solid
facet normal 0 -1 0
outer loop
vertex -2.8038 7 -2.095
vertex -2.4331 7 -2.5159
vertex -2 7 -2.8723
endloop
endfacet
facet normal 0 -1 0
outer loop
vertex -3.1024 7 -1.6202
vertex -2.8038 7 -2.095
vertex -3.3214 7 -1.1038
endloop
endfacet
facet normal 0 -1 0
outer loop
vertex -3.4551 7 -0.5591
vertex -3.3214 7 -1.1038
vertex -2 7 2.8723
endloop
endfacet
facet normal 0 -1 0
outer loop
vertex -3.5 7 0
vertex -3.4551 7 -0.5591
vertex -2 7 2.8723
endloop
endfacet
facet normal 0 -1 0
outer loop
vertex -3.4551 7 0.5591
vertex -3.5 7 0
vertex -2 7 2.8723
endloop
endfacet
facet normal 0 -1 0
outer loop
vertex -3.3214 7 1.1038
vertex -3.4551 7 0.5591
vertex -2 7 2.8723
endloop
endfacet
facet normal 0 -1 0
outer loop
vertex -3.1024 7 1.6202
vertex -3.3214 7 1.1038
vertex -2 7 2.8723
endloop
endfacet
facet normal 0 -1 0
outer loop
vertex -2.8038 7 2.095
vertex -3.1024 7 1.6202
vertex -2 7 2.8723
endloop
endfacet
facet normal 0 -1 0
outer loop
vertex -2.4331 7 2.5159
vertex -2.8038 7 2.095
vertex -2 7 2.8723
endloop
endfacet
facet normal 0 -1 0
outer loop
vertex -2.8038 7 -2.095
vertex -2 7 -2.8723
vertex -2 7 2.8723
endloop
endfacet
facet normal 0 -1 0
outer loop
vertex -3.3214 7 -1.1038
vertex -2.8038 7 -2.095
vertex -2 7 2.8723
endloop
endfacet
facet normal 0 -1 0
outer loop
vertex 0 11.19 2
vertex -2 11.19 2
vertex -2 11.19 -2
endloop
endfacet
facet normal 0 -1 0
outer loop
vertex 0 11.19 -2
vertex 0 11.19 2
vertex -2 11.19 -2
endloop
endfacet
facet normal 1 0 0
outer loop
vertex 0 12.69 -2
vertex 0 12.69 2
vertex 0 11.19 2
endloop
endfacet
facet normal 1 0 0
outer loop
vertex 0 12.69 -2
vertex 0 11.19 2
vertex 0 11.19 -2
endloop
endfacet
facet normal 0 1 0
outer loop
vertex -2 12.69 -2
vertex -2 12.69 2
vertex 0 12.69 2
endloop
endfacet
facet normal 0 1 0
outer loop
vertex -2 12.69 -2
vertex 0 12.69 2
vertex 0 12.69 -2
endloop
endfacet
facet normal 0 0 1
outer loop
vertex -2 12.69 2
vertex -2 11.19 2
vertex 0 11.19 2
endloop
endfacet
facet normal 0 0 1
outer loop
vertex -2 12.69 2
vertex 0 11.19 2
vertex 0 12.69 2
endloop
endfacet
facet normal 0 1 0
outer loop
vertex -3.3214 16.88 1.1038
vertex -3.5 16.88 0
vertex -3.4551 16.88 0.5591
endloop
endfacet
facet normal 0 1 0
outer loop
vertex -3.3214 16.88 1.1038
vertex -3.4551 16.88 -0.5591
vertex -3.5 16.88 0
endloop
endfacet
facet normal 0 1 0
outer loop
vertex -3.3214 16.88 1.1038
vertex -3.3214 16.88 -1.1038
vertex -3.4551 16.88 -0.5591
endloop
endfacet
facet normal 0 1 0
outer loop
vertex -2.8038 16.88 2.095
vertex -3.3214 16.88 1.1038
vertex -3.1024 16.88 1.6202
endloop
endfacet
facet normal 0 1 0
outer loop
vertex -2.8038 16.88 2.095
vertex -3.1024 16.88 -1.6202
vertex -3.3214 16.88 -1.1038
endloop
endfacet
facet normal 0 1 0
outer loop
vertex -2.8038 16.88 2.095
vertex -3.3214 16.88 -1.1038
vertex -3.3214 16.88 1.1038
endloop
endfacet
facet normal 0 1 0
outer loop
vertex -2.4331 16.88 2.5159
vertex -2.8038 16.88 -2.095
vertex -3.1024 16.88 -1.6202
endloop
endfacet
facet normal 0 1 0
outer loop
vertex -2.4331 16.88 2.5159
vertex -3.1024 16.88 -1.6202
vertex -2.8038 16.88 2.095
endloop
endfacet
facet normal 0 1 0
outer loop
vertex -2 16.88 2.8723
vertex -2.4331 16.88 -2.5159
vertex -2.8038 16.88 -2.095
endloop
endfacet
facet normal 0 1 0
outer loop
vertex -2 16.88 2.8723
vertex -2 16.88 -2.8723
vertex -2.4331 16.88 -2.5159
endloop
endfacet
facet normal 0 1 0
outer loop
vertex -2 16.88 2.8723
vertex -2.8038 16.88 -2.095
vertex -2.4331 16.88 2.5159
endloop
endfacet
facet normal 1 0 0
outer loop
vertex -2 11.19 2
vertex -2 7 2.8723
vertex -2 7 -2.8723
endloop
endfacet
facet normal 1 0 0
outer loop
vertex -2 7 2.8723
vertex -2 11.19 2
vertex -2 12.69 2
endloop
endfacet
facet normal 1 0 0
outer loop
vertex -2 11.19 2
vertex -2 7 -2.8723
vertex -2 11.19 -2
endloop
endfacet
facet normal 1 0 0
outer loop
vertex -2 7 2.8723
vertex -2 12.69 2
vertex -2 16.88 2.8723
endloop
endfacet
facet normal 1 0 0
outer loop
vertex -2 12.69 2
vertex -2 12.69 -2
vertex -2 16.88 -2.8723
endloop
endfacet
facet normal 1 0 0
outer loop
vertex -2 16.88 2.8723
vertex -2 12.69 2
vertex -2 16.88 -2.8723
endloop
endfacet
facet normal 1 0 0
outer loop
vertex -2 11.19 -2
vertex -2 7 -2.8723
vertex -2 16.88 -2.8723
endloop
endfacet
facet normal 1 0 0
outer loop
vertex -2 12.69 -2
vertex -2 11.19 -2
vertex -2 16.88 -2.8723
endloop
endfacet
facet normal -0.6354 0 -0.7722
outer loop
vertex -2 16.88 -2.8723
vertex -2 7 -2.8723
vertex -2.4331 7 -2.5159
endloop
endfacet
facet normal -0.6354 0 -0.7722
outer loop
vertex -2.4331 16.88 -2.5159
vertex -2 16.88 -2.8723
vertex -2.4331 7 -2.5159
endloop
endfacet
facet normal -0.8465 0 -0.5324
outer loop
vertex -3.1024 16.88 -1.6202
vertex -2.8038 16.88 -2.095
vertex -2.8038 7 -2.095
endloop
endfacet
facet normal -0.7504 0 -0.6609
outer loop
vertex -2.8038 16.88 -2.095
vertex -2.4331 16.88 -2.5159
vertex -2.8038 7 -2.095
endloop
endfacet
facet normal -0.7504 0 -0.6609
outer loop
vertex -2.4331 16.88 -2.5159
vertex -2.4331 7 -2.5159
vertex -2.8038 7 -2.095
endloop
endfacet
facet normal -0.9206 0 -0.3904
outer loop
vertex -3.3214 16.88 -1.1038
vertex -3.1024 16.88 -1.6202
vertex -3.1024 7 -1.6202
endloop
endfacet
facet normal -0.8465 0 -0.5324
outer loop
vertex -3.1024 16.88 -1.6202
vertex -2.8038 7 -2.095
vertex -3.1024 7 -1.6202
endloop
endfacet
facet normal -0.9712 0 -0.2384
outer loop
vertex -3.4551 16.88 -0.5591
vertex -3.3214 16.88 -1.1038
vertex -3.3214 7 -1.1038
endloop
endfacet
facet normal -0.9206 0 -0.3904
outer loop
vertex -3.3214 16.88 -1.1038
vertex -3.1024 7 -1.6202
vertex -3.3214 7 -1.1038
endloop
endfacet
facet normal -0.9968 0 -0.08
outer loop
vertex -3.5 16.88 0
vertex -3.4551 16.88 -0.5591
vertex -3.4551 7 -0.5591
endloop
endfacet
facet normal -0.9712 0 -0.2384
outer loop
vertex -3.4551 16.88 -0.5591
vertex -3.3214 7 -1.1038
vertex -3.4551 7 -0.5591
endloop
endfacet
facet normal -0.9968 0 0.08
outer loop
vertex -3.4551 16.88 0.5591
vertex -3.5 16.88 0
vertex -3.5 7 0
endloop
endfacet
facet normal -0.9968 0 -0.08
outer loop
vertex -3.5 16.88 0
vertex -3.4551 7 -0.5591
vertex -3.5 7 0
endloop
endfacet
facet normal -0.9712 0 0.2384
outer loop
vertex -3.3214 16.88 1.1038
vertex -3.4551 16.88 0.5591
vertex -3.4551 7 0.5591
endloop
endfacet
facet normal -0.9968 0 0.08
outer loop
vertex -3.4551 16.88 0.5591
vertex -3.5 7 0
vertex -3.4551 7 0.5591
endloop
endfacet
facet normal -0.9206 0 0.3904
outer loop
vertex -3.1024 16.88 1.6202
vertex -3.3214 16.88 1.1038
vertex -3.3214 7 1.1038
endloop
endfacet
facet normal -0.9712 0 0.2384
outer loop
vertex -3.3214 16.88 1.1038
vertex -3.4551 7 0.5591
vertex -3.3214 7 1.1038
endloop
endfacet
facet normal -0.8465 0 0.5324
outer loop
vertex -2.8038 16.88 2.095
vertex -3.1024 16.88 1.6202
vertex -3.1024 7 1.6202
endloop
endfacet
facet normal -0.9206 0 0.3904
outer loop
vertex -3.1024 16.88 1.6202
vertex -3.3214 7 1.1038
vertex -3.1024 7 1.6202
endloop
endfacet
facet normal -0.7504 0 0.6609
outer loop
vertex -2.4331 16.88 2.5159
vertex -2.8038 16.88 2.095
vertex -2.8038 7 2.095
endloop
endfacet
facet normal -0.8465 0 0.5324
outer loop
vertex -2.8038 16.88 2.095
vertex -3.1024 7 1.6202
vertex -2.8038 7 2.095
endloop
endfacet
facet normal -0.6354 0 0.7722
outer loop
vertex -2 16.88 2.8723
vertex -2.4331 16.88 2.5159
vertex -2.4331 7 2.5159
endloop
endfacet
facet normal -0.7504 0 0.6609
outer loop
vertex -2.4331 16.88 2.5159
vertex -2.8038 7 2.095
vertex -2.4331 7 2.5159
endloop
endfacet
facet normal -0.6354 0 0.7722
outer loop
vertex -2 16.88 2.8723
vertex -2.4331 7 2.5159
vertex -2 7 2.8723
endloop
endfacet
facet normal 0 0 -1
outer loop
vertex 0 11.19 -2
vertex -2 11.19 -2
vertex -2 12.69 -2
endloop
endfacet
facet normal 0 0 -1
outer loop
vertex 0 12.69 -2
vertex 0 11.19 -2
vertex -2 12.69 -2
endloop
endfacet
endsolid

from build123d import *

# Parameters (mm, degrees)
SKETCH_1_R               = 2.5
EXTRUDE_1_DEPTH          = 23.88
SKETCH_2_R               = 1
EXTRUDE_2_DEPTH          = 1
CUT_EXTRUDE_1_DEPTH      = 5
CUT_EXTRUDE_START        = 18.88
CUT_EXTRUDE_2_DEPTH      = 5
SKETCH_6_R               = 0.25
CUT_EXTRUDE_3_DEPTH      = 0.25
CUT_EXTRUDE_START_2      = 5.25
SKETCH_7_R               = 0.25
CUT_EXTRUDE_4_DEPTH      = 0.25
EXTRUDE_START            = 7
SKETCH_17_R              = 3.5
EXTRUDE_5_DEPTH          = 9.88
CUT_EXTRUDE_6_DEPTH      = 26.937509518
CUT_EXTRUDE_6_DEPTH_BACK = 26.937509518
SKETCH_20_OUTSIDE_W      = 20.616
SKETCH_20_OUTSIDE_H      = 31.496
SKETCH_20_OUTSIDE_W_2    = 7
SKETCH_20_OUTSIDE_H_2    = 9.88
CUT_EXTRUDE_7_DEPTH      = 18.590747568
CUT_EXTRUDE_7_DEPTH_BACK = 18.590747568
SKETCH_22_W              = 5.5
SKETCH_22_H              = 9.88
EXTRUDE_START_2          = -2
SKETCH_24_W              = 4
SKETCH_24_H              = 1.5
EXTRUDE_6_DEPTH          = 2


with BuildPart() as part:
    # 草图1 → 凸台-拉伸1 (new body)
    with BuildSketch(Plane(origin=(0, 0, 0), x_dir=(1, 0, 0), z_dir=(0, 1, 0))):
        with Locations(Location((0, 0, 0), (0, 0, 90))):
            Circle(SKETCH_1_R)
    extrude(amount=EXTRUDE_1_DEPTH)

    # 草图2 → 凸台-拉伸2 (add)
    with BuildSketch(Plane(origin=(0, 0, 0), x_dir=(1, 0, 0), z_dir=(0, 1, 0))):
        with BuildLine():
            Line((0.166666667, 2.494438258), (7.633333333, 1.995550606))
            ThreePointArc((7.633333333, 1.995550606), (9.5, 0), (7.633333333, -1.995550606))
            Line((7.633333333, -1.995550606), (0.166666667, -2.494438258))
            ThreePointArc((0.166666667, -2.494438258), (-2.5, 0), (0.166666667, 2.494438258))
        make_face()
        with Locations(Location((7.5, 0, 0), (0, 0, 270))):
            Circle(SKETCH_2_R, mode=Mode.SUBTRACT)
    extrude(amount=EXTRUDE_2_DEPTH)

    # 草图3 → 切除-拉伸1 (cut)
    with BuildSketch(Plane(origin=(0, 0, 0), x_dir=(1, 0, 0), z_dir=(0, 1, 0))):
        with BuildLine():
            Line((-1.854049622, -0.75), (-0.75, -0.75))
            Line((-0.75, -0.75), (-0.75, -1.854049622))
            ThreePointArc((-0.75, -1.854049622), (0, -2), (0.75, -1.854049622))
            Line((0.75, -1.854049622), (0.75, -0.75))
            Line((0.75, -0.75), (1.854049622, -0.75))
            ThreePointArc((1.854049622, -0.75), (2, 0), (1.854049622, 0.75))
            Line((1.854049622, 0.75), (0.75, 0.75))
            Line((0.75, 0.75), (0.75, 1.854049622))
            ThreePointArc((0.75, 1.854049622), (0, 2), (-0.75, 1.854049622))
            Line((-0.75, 1.854049622), (-0.75, 0.75))
            Line((-0.75, 0.75), (-1.854049622, 0.75))
            ThreePointArc((-1.854049622, 0.75), (-2, 0), (-1.854049622, -0.75))
        make_face()
    extrude(amount=CUT_EXTRUDE_1_DEPTH, mode=Mode.SUBTRACT)

    # 草图5 → 切除-拉伸2 (cut)
    with BuildSketch(Plane(origin=(0, 0, 0), x_dir=(1, 0, 0), z_dir=(0, 1, 0)).offset(CUT_EXTRUDE_START)):
        with BuildLine():
            Line((1.854049622, 0.75), (0.75, 0.75))
            Line((0.75, 0.75), (0.75, 1.854049622))
            ThreePointArc((0.75, 1.854049622), (0, 2), (-0.75, 1.854049622))
            Line((-0.75, 1.854049622), (-0.75, 0.75))
            Line((-0.75, 0.75), (-1.854049622, 0.75))
            ThreePointArc((-1.854049622, 0.75), (-2, 0), (-1.854049622, -0.75))
            Line((-1.854049622, -0.75), (-0.75, -0.75))
            Line((-0.75, -0.75), (-0.75, -1.854049622))
            ThreePointArc((-0.75, -1.854049622), (0, -2), (0.75, -1.854049622))
            Line((0.75, -1.854049622), (0.75, -0.75))
            Line((0.75, -0.75), (1.854049622, -0.75))
            ThreePointArc((1.854049622, -0.75), (2, 0), (1.854049622, 0.75))
        make_face()
    extrude(amount=CUT_EXTRUDE_2_DEPTH, mode=Mode.SUBTRACT)

    # 草图6 → 切除-拉伸3 (cut)
    with BuildSketch(Plane(origin=(0, 0, 0), x_dir=(1, 0, 0), z_dir=(0, 1, 0)).offset(CUT_EXTRUDE_START)):
        with Locations(Location((0.75, 0, 0), (0, 0, 270))):
            Circle(SKETCH_6_R)
    extrude(amount=-CUT_EXTRUDE_3_DEPTH, mode=Mode.SUBTRACT)

    # 草图7 → 切除-拉伸4 (cut)
    with BuildSketch(Plane(origin=(0, 0, 0), x_dir=(1, 0, 0), z_dir=(0, 1, 0)).offset(CUT_EXTRUDE_START_2)):
        with Locations(Location((0.75, 0, 0), (0, 0, 270))):
            Circle(SKETCH_7_R)
    extrude(amount=-CUT_EXTRUDE_4_DEPTH, mode=Mode.SUBTRACT)

    # 草图17 → 凸台-拉伸5 (add)
    with BuildSketch(Plane(origin=(0, 0, 0), x_dir=(1, 0, 0), z_dir=(0, 1, 0)).offset(EXTRUDE_START)):
        with Locations(Location((0, 0, 0), (0, 0, 270))):
            Circle(SKETCH_17_R)
    extrude(amount=EXTRUDE_5_DEPTH)

    # 草图20 outside → 切除-拉伸6 (cut, two sides: drawn at the far end of the back side and taken through both)
    with BuildSketch(Plane.XY.offset(-CUT_EXTRUDE_6_DEPTH_BACK)):
        with Locations((3, 11.94)):
            Rectangle(SKETCH_20_OUTSIDE_W, SKETCH_20_OUTSIDE_H)
        with Locations((0, 11.94)):
            Rectangle(SKETCH_20_OUTSIDE_W_2, SKETCH_20_OUTSIDE_H_2, mode=Mode.SUBTRACT)
    extrude(amount=CUT_EXTRUDE_6_DEPTH + CUT_EXTRUDE_6_DEPTH_BACK, mode=Mode.SUBTRACT)

    # 草图22 → 切除-拉伸7 (cut, two sides: drawn at the far end of the back side and taken through both)
    with BuildSketch(Plane.XY.offset(-CUT_EXTRUDE_7_DEPTH_BACK)):
        with Locations((0.75, 11.94)):
            Rectangle(SKETCH_22_W, SKETCH_22_H)
    extrude(amount=CUT_EXTRUDE_7_DEPTH + CUT_EXTRUDE_7_DEPTH_BACK, mode=Mode.SUBTRACT)

    # 草图24 → 凸台-拉伸6 (add)
    with BuildSketch(Plane(origin=(0, 0, 0), x_dir=(0, 0, -1), z_dir=(1, 0, 0)).offset(EXTRUDE_START_2)):
        with Locations((0, 11.94)):
            Rectangle(SKETCH_24_W, SKETCH_24_H)
    extrude(amount=EXTRUDE_6_DEPTH)


solid = part.part
